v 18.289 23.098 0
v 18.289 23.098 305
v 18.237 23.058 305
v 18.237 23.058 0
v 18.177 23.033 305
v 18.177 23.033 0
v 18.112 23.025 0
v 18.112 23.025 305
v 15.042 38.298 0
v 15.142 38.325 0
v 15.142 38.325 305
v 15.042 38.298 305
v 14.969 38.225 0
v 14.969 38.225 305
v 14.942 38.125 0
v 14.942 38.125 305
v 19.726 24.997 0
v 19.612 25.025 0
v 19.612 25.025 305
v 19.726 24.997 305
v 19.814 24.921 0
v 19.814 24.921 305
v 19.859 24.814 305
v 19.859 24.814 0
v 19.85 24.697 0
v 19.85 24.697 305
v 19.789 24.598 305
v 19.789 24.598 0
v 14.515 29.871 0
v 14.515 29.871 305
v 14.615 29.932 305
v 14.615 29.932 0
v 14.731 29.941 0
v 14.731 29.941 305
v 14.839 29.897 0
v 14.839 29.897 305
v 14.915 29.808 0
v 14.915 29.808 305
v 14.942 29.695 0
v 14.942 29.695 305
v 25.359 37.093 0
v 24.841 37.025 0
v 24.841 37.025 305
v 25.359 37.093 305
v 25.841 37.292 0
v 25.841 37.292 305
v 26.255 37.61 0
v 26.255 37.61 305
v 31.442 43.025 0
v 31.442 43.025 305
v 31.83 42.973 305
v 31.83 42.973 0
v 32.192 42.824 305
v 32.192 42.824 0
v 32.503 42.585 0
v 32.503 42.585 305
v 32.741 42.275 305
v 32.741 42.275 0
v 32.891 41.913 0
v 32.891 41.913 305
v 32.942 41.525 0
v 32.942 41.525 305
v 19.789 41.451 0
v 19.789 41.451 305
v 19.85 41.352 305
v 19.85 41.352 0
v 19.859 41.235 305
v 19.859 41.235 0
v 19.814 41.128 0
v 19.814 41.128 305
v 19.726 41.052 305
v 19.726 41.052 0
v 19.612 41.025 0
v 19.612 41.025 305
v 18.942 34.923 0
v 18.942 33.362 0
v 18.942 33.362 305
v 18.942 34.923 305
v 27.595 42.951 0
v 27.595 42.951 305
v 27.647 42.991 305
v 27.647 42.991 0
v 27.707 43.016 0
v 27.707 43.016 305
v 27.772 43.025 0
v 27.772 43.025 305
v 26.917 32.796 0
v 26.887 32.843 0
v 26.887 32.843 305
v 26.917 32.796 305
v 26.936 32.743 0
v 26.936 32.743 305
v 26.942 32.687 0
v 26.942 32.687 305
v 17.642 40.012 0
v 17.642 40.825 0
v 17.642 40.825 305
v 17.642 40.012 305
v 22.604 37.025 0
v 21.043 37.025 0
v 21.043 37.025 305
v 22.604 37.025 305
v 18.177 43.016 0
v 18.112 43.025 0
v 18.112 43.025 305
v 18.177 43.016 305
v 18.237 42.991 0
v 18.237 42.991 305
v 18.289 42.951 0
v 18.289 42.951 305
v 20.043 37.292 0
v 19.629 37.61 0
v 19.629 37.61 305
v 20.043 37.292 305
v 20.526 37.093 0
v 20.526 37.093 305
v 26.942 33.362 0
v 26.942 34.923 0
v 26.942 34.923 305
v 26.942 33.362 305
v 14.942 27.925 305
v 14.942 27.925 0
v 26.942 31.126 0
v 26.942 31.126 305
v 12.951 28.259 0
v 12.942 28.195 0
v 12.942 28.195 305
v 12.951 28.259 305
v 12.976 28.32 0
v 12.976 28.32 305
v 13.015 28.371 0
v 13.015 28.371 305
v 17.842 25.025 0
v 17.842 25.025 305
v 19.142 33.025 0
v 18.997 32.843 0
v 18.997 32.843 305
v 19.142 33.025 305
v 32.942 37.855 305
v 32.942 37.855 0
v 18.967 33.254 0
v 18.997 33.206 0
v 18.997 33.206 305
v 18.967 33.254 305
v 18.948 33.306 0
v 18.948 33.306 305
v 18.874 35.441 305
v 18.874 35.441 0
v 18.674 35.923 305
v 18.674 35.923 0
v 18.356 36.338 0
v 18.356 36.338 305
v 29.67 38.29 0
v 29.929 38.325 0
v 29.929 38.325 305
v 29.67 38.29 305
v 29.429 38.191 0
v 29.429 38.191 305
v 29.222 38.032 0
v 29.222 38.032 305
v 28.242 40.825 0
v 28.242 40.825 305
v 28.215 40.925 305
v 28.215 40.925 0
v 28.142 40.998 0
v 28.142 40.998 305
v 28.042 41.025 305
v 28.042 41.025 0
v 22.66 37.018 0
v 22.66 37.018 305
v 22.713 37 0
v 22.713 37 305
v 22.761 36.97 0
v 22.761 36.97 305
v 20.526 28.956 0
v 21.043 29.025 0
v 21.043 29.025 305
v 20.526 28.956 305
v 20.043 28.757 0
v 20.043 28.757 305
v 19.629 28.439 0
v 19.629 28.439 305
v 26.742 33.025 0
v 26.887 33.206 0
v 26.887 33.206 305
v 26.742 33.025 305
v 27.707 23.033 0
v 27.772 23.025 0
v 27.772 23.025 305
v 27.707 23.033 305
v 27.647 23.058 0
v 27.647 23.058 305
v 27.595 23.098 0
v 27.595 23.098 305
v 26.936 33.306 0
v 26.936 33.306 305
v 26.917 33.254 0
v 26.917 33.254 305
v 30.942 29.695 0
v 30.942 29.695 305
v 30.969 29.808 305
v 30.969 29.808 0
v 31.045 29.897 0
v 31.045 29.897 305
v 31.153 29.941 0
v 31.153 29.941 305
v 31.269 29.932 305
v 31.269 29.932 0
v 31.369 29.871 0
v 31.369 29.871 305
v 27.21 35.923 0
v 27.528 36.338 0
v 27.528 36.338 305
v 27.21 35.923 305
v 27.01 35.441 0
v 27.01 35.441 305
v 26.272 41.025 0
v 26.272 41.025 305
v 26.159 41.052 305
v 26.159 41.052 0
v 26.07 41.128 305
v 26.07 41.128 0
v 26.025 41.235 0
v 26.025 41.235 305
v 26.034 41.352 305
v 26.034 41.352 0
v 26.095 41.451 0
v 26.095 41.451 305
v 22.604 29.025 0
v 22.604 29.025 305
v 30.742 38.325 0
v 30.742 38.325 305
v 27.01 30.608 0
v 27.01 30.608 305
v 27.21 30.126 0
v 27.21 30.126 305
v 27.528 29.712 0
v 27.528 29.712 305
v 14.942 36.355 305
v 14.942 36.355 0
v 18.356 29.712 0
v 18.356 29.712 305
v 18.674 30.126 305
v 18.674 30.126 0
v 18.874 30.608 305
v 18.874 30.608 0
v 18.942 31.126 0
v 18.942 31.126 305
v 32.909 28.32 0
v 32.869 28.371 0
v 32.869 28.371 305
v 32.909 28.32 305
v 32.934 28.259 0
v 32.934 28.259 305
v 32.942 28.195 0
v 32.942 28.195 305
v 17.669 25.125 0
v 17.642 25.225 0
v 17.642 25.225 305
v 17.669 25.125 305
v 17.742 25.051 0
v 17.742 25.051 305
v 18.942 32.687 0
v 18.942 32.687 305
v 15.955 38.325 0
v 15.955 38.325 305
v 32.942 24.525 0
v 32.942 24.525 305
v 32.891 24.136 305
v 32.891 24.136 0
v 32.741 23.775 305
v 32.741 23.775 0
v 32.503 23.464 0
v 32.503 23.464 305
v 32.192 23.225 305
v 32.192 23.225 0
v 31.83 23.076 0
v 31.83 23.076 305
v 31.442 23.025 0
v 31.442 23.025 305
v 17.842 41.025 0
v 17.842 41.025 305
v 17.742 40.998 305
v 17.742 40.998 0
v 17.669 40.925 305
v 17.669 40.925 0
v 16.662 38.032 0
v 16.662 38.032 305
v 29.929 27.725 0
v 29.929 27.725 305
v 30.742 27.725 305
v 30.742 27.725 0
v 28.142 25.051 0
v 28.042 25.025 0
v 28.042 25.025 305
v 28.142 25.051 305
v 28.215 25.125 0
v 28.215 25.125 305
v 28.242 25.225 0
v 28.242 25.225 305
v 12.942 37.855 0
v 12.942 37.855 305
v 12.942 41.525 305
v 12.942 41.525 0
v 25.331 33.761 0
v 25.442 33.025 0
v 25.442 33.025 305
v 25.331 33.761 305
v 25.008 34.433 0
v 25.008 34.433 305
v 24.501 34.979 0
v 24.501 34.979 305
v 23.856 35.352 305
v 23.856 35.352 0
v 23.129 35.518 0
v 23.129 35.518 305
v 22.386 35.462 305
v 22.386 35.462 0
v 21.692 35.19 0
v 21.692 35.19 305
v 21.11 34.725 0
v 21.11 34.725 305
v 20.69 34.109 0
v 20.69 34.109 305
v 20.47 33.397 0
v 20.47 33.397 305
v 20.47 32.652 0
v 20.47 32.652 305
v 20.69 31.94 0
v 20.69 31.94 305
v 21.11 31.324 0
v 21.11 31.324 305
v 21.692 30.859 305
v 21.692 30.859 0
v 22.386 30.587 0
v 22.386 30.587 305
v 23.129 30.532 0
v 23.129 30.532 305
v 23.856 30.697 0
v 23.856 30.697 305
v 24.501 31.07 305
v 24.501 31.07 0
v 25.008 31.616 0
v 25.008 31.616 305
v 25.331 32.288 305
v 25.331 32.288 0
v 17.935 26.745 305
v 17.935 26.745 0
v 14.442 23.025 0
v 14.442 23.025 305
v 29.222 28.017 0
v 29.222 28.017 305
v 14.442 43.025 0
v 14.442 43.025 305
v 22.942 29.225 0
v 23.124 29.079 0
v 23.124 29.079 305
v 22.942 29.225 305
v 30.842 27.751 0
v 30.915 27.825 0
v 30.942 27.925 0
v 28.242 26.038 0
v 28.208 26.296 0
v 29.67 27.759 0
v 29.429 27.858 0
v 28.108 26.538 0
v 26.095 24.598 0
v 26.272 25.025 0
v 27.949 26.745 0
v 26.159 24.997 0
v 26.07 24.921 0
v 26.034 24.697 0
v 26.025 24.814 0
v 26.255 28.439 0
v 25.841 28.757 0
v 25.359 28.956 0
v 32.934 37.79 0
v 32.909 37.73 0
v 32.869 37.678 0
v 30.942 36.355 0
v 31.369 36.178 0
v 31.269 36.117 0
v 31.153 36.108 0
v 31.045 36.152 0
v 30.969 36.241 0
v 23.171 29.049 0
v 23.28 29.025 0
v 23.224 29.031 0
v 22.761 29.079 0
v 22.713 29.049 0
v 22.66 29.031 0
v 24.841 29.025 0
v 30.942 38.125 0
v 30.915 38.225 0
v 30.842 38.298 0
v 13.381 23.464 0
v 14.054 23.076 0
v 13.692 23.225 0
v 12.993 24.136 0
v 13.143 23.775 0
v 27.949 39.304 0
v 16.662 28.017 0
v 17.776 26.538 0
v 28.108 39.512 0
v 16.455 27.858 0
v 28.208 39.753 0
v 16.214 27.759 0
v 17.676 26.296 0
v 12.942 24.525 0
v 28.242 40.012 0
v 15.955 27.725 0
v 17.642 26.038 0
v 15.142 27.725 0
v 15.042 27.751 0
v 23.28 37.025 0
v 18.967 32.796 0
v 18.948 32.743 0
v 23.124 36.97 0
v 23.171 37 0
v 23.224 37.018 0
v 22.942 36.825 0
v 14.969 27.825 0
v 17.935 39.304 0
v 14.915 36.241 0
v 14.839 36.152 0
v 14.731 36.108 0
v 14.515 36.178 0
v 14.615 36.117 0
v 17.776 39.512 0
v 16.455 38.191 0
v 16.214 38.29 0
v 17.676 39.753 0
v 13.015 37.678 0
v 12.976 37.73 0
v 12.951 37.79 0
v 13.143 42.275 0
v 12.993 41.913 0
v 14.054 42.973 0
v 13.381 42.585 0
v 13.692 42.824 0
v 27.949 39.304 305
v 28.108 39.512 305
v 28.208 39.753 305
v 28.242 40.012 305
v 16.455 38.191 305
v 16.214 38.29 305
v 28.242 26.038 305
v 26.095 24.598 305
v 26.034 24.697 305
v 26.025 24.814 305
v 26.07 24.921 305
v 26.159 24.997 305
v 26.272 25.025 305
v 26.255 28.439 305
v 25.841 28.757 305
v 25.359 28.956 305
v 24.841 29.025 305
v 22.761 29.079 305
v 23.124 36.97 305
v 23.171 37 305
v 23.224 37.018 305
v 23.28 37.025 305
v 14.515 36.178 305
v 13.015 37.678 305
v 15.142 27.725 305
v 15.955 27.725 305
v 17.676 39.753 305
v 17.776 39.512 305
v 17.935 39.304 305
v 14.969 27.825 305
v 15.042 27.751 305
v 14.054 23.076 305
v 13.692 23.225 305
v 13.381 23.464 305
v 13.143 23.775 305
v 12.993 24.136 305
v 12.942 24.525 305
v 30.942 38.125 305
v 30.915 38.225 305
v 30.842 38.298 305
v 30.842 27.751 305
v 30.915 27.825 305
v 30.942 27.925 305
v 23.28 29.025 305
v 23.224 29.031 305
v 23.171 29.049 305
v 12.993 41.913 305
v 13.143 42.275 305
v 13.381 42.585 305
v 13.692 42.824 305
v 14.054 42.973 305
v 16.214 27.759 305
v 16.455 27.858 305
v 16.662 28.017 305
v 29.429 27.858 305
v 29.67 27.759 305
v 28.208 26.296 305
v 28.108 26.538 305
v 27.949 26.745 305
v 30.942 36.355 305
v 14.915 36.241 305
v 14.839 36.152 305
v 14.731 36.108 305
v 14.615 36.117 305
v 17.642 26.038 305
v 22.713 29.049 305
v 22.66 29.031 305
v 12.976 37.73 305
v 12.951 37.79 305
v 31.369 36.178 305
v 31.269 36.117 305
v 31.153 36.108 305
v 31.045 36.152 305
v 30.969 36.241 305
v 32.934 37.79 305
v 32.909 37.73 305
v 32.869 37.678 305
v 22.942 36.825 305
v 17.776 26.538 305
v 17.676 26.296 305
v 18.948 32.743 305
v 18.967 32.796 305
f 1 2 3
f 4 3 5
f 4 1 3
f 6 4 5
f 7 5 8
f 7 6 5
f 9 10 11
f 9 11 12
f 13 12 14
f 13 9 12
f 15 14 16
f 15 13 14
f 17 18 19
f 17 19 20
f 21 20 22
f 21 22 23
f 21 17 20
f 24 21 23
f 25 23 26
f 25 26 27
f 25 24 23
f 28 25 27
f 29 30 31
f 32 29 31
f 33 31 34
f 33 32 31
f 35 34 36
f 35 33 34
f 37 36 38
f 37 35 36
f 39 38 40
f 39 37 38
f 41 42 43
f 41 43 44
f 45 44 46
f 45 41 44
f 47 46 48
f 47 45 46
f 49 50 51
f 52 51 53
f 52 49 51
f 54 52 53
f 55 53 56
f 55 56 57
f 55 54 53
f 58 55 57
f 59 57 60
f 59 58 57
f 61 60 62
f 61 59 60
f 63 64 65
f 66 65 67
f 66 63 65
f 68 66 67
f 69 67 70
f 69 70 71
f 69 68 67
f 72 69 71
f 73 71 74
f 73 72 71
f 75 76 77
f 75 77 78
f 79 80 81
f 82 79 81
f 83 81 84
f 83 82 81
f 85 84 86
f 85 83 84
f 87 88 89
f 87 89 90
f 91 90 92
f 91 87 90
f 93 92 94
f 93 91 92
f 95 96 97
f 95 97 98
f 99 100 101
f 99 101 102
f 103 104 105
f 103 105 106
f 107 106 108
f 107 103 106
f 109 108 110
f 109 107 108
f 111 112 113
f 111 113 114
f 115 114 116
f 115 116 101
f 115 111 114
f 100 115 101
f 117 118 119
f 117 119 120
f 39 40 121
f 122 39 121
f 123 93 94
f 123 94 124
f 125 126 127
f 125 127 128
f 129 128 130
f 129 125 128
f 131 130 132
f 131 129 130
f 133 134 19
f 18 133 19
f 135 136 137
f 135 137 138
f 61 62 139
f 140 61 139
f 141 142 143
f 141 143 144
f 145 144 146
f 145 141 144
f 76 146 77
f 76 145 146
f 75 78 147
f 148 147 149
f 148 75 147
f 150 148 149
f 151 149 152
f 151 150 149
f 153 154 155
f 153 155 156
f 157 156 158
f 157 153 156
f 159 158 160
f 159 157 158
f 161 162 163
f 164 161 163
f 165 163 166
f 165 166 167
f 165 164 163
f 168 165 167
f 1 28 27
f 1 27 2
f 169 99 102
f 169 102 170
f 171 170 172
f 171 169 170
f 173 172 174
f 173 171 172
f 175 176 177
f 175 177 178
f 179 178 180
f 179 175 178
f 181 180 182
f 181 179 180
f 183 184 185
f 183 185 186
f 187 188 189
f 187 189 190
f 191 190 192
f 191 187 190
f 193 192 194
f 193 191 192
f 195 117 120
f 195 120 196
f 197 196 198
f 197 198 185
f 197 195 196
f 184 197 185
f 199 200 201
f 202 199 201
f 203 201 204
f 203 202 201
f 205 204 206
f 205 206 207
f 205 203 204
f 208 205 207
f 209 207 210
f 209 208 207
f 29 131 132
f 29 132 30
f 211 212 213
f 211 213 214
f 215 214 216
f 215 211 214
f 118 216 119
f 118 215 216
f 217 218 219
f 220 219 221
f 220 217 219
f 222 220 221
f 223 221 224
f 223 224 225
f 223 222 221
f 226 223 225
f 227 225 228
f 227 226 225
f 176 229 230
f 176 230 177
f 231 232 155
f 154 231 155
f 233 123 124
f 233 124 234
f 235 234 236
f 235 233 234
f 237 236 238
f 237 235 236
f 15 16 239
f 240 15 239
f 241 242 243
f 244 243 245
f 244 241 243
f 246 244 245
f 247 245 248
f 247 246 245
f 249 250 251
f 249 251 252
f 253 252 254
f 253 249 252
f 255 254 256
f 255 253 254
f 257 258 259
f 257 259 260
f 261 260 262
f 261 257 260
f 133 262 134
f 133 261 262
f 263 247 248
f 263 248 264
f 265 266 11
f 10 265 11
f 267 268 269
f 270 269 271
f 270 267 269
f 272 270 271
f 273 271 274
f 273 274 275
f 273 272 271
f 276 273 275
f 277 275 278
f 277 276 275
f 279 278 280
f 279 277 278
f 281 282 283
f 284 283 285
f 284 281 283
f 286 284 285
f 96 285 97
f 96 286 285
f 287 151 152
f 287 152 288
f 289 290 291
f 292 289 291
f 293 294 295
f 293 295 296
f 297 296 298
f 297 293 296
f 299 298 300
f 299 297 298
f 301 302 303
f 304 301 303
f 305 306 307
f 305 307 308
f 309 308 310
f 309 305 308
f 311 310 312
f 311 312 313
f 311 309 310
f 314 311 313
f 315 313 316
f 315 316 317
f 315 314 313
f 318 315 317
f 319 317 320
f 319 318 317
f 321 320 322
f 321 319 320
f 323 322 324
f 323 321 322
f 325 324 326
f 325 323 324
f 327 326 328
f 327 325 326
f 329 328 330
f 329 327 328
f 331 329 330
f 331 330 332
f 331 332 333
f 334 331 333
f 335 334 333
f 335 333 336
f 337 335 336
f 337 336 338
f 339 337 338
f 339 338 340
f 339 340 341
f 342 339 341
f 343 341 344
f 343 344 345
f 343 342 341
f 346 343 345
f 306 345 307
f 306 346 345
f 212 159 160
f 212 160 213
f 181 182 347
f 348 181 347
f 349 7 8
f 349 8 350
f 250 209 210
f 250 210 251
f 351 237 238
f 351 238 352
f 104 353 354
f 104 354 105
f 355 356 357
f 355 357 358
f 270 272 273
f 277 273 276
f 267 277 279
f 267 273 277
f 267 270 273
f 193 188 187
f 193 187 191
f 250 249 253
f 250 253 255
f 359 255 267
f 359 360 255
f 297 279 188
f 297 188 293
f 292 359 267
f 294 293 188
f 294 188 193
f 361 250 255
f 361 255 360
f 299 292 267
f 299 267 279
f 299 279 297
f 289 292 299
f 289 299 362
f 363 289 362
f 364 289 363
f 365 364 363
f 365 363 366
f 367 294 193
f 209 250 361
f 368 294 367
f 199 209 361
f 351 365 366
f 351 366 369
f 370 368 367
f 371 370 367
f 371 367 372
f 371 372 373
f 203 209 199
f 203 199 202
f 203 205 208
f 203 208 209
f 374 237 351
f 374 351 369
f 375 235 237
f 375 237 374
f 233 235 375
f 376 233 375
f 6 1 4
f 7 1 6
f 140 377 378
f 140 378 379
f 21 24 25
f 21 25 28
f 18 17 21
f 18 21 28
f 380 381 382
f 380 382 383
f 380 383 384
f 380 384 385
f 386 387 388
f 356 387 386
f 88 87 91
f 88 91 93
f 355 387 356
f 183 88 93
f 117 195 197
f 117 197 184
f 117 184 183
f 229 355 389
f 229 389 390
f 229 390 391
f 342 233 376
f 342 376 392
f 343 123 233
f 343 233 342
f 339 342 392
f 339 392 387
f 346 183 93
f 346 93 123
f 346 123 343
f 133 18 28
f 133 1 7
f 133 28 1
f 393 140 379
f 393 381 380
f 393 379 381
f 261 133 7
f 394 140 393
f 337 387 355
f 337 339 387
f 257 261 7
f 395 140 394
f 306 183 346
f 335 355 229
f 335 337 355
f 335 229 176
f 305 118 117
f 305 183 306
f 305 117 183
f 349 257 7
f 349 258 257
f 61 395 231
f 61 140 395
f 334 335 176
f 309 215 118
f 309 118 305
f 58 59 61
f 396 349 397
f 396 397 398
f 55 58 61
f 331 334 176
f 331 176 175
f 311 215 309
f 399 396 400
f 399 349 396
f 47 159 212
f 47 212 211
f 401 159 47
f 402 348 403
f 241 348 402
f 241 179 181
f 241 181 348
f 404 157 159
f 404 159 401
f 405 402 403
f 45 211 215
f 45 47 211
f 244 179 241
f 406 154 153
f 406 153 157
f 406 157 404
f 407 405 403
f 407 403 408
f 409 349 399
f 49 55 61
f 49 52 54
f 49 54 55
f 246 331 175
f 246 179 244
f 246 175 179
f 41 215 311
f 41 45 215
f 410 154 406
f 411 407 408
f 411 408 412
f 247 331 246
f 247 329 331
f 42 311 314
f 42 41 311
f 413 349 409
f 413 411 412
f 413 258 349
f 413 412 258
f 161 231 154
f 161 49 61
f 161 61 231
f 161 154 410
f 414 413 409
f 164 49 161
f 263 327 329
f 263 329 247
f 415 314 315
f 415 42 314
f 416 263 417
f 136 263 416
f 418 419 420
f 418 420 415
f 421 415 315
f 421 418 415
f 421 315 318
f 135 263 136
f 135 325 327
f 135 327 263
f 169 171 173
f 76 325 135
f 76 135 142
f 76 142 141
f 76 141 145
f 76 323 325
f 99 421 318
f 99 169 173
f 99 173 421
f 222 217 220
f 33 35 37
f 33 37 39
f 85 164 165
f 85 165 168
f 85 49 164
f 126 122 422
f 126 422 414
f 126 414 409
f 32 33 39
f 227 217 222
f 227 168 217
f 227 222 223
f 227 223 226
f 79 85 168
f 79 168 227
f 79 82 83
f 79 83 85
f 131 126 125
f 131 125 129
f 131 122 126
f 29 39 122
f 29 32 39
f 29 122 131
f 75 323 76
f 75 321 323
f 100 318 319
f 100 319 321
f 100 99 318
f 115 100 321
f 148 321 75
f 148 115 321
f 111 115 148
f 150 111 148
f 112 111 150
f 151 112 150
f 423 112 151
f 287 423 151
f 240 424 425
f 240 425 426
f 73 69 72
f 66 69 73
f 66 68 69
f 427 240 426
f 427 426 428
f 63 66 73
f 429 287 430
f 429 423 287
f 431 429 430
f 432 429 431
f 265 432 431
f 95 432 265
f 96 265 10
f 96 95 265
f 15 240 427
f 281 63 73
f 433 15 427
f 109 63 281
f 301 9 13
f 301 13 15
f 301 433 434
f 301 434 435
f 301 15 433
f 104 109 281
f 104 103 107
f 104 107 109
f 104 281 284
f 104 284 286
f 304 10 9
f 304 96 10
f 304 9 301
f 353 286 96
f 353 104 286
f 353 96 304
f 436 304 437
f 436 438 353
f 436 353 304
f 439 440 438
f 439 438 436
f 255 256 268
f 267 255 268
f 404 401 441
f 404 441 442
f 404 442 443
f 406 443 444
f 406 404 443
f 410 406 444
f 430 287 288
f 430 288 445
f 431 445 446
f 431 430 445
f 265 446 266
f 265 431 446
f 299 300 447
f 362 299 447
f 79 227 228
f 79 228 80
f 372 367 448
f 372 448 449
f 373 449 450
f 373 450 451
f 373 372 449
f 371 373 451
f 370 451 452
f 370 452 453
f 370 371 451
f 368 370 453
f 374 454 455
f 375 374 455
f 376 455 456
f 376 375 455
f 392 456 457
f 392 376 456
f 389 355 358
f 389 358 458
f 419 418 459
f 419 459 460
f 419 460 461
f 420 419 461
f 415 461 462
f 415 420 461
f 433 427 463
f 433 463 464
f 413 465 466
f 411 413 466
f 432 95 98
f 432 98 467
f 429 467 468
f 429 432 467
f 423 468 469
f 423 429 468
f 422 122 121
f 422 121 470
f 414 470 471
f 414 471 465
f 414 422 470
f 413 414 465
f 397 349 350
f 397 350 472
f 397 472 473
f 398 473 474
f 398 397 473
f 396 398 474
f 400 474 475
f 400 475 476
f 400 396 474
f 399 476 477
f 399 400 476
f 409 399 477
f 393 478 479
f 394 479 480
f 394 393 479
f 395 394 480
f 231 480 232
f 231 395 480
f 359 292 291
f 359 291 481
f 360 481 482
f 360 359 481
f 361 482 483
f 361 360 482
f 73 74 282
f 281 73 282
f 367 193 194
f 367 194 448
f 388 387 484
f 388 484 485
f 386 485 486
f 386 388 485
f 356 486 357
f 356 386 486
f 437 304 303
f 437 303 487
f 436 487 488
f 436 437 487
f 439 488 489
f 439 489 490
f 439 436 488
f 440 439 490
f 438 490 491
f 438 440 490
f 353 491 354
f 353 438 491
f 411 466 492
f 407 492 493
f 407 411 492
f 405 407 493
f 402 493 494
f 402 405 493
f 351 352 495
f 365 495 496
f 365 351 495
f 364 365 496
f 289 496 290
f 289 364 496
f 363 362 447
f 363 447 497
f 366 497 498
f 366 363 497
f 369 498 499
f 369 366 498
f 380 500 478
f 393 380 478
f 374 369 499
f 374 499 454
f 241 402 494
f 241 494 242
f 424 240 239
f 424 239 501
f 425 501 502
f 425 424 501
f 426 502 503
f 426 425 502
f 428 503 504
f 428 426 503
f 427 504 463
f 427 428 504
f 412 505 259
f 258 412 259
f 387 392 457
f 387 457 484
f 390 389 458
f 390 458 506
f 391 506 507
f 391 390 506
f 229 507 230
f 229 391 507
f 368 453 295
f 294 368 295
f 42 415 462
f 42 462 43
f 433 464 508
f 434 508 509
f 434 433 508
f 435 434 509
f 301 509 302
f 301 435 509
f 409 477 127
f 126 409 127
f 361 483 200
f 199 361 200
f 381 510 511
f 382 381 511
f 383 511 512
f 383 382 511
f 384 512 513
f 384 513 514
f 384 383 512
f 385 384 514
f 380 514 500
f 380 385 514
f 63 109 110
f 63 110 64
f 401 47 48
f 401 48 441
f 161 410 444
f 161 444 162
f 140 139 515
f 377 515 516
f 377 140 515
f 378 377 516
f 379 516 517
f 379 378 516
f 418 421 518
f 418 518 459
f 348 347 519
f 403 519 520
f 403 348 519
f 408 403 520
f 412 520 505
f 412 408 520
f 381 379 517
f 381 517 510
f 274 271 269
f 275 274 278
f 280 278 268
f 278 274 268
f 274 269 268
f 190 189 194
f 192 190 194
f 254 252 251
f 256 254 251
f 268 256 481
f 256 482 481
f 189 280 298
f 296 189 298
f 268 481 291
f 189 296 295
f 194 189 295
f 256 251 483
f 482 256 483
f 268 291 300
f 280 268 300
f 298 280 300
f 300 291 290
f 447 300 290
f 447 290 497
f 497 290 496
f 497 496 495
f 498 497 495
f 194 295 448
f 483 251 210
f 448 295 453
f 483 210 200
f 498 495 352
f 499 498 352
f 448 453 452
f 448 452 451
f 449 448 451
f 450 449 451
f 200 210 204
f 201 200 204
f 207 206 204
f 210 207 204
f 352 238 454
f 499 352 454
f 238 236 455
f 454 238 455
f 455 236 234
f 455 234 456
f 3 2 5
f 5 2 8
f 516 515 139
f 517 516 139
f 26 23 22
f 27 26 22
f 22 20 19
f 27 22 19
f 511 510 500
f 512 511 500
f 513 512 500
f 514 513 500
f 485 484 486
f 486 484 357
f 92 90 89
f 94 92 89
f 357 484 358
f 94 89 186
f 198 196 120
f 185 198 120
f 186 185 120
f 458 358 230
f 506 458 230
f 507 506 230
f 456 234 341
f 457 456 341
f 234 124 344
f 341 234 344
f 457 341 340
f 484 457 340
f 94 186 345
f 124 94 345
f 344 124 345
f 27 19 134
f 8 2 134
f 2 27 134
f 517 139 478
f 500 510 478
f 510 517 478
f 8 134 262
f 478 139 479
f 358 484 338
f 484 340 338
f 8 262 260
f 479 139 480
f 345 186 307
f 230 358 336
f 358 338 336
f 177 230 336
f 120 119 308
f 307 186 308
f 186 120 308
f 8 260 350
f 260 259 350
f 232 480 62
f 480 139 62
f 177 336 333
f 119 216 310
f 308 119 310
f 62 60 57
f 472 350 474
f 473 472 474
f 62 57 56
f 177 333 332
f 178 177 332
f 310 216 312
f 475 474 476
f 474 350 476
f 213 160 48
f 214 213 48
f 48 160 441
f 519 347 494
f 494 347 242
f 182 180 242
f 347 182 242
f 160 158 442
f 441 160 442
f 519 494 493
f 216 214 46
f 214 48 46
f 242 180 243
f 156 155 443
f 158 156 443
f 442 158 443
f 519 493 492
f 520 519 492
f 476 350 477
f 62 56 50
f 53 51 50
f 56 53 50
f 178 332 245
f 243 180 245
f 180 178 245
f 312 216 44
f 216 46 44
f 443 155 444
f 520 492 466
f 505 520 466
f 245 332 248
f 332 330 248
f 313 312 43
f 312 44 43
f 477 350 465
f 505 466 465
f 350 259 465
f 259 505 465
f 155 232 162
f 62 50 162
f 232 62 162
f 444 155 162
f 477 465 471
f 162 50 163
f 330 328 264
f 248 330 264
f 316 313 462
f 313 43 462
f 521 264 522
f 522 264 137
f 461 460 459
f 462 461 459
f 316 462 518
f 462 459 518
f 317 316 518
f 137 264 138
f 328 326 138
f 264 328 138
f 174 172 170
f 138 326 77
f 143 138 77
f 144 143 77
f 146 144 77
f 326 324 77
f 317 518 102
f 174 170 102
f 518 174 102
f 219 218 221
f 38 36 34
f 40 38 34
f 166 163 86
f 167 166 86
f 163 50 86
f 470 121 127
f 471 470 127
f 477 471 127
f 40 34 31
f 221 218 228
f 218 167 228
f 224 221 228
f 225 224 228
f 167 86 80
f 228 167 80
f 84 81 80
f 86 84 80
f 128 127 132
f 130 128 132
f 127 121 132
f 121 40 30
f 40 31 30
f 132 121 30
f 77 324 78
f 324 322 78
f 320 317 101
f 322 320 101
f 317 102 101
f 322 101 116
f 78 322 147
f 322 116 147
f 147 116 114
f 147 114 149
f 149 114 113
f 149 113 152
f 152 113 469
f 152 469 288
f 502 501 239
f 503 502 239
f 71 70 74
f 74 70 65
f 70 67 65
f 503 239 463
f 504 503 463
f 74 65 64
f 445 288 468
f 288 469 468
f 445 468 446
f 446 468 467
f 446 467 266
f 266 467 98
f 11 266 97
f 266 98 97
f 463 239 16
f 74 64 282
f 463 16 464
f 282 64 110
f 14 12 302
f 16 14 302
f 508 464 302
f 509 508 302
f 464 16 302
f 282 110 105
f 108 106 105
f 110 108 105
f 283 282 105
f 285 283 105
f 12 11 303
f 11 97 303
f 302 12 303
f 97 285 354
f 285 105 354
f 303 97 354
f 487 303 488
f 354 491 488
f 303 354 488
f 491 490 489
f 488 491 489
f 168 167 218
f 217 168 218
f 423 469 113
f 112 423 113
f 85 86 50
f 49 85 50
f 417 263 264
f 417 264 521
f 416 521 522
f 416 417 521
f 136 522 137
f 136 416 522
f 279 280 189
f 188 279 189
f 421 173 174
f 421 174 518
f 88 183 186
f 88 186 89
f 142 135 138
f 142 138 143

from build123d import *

# Parameters (mm, degrees)
MODEL_R         = 2.5
EXTRUDE_1_DEPTH = 305


with BuildPart() as part:
    # Model → Бобышка-Вытянуть1 (new body)
    with BuildSketch(Plane.XY):
        with BuildLine():
            Line((18.94214915, 33.362214718), (18.94214915, 34.923300122))
            ThreePointArc((18.94214915, 34.923300122), (18.789908215, 35.688666987), (18.356362712, 36.337513684))
            Line((18.356362712, 36.337513684), (16.662250163, 38.031626234))
            ThreePointArc((16.662250163, 38.031626234), (16.337826814, 38.248398985), (15.955143382, 38.324519453))
            Line((15.955143382, 38.324519453), (15.14214915, 38.324519453))
            ThreePointArc((15.14214915, 38.324519453), (15.000727794, 38.265940809), (14.94214915, 38.124519453))
            Line((14.94214915, 38.124519453), (14.94214915, 36.354519453))
            ThreePointArc((14.94214915, 36.354519453), (14.787820008, 36.12354957), (14.515372455, 36.177742757))
            Line((14.515372455, 36.177742757), (13.015372455, 37.677742757))
            ThreePointArc((13.015372455, 37.677742757), (12.961179267, 37.758848595), (12.94214915, 37.854519453))
            Line((12.94214915, 37.854519453), (12.94214915, 41.524519453))
            ThreePointArc((12.94214915, 41.524519453), (13.381488978, 42.585179625), (14.44214915, 43.024519453))
            Line((14.44214915, 43.024519453), (18.11214915, 43.024519453))
            ThreePointArc((18.11214915, 43.024519453), (18.207820008, 43.005489336), (18.288925845, 42.951296148))
            Line((18.288925845, 42.951296148), (19.788925845, 41.451296148))
            ThreePointArc((19.788925845, 41.451296148), (19.843119033, 41.178848595), (19.61214915, 41.024519453))
            Line((19.61214915, 41.024519453), (17.84214915, 41.024519453))
            ThreePointArc((17.84214915, 41.024519453), (17.700727794, 40.965940809), (17.64214915, 40.824519453))
            Line((17.64214915, 40.824519453), (17.64214915, 40.011525221))
            ThreePointArc((17.64214915, 40.011525221), (17.718269617, 39.628841789), (17.935042369, 39.30441844))
            Line((17.935042369, 39.30441844), (19.629154919, 37.61030589))
            ThreePointArc((19.629154919, 37.61030589), (20.278001616, 37.176760388), (21.043368481, 37.024519453))
            Line((21.043368481, 37.024519453), (22.604453885, 37.024519453))
            ThreePointArc((22.604453885, 37.024519453), (22.687205621, 37.010426533), (22.760627647, 36.969736655))
            Line((22.760627647, 36.969736655), (22.94214915, 36.824519453))
            Line((22.94214915, 36.824519453), (23.123670653, 36.969736655))
            ThreePointArc((23.123670653, 36.969736655), (23.197092679, 37.010426533), (23.279844415, 37.024519453))
            Line((23.279844415, 37.024519453), (24.840929819, 37.024519453))
            ThreePointArc((24.840929819, 37.024519453), (25.606296684, 37.176760388), (26.255143382, 37.61030589))
            Line((26.255143382, 37.61030589), (27.949255931, 39.30441844))
            ThreePointArc((27.949255931, 39.30441844), (28.166028683, 39.628841789), (28.24214915, 40.011525221))
            Line((28.24214915, 40.011525221), (28.24214915, 40.824519453))
            ThreePointArc((28.24214915, 40.824519453), (28.183570506, 40.965940809), (28.04214915, 41.024519453))
            Line((28.04214915, 41.024519453), (26.27214915, 41.024519453))
            ThreePointArc((26.27214915, 41.024519453), (26.041179267, 41.178848595), (26.095372455, 41.451296148))
            Line((26.095372455, 41.451296148), (27.595372455, 42.951296148))
            ThreePointArc((27.595372455, 42.951296148), (27.676478292, 43.005489336), (27.77214915, 43.024519453))
            Line((27.77214915, 43.024519453), (31.44214915, 43.024519453))
            ThreePointArc((31.44214915, 43.024519453), (32.502809322, 42.585179625), (32.94214915, 41.524519453))
            Line((32.94214915, 41.524519453), (32.94214915, 37.854519453))
            ThreePointArc((32.94214915, 37.854519453), (32.923119033, 37.758848595), (32.868925845, 37.677742757))
            Line((32.868925845, 37.677742757), (31.368925845, 36.177742757))
            ThreePointArc((31.368925845, 36.177742757), (31.096478292, 36.12354957), (30.94214915, 36.354519453))
            Line((30.94214915, 36.354519453), (30.94214915, 38.124519453))
            ThreePointArc((30.94214915, 38.124519453), (30.883570506, 38.265940809), (30.74214915, 38.324519453))
            Line((30.74214915, 38.324519453), (29.929154919, 38.324519453))
            ThreePointArc((29.929154919, 38.324519453), (29.546471486, 38.248398985), (29.222048137, 38.031626234))
            Line((29.222048137, 38.031626234), (27.527935588, 36.337513684))
            ThreePointArc((27.527935588, 36.337513684), (27.094390085, 35.688666987), (26.94214915, 34.923300122))
            Line((26.94214915, 34.923300122), (26.94214915, 33.362214718))
            ThreePointArc((26.94214915, 33.362214718), (26.92805623, 33.279462982), (26.887366352, 33.206040956))
            Line((26.887366352, 33.206040956), (26.74214915, 33.024519453))
            Line((26.74214915, 33.024519453), (26.887366352, 32.84299795))
            ThreePointArc((26.887366352, 32.84299795), (26.92805623, 32.769575923), (26.94214915, 32.686824188))
            Line((26.94214915, 32.686824188), (26.94214915, 31.125738784))
            ThreePointArc((26.94214915, 31.125738784), (27.094390085, 30.360371919), (27.527935588, 29.711525221))
            Line((27.527935588, 29.711525221), (29.222048137, 28.017412672))
            ThreePointArc((29.222048137, 28.017412672), (29.546471486, 27.80063992), (29.929154919, 27.724519453))
            Line((29.929154919, 27.724519453), (30.74214915, 27.724519453))
            ThreePointArc((30.74214915, 27.724519453), (30.883570506, 27.783098097), (30.94214915, 27.924519453))
            Line((30.94214915, 27.924519453), (30.94214915, 29.694519453))
            ThreePointArc((30.94214915, 29.694519453), (31.096478292, 29.925489336), (31.368925845, 29.871296148))
            Line((31.368925845, 29.871296148), (32.868925845, 28.371296148))
            ThreePointArc((32.868925845, 28.371296148), (32.923119033, 28.290190311), (32.94214915, 28.194519453))
            Line((32.94214915, 28.194519453), (32.94214915, 24.524519453))
            ThreePointArc((32.94214915, 24.524519453), (32.502809322, 23.463859281), (31.44214915, 23.024519453))
            Line((31.44214915, 23.024519453), (27.77214915, 23.024519453))
            ThreePointArc((27.77214915, 23.024519453), (27.676478292, 23.04354957), (27.595372455, 23.097742757))
            Line((27.595372455, 23.097742757), (26.095372455, 24.597742757))
            ThreePointArc((26.095372455, 24.597742757), (26.041179267, 24.870190311), (26.27214915, 25.024519453))
            Line((26.27214915, 25.024519453), (28.04214915, 25.024519453))
            ThreePointArc((28.04214915, 25.024519453), (28.183570506, 25.083098097), (28.24214915, 25.224519453))
            Line((28.24214915, 25.224519453), (28.24214915, 26.037513684))
            ThreePointArc((28.24214915, 26.037513684), (28.166028683, 26.420197117), (27.949255931, 26.744620465))
            Line((27.949255931, 26.744620465), (26.255143382, 28.438733015))
            ThreePointArc((26.255143382, 28.438733015), (25.606296684, 28.872278518), (24.840929819, 29.024519453))
            Line((24.840929819, 29.024519453), (23.279844415, 29.024519453))
            ThreePointArc((23.279844415, 29.024519453), (23.197092679, 29.038612373), (23.123670653, 29.07930225))
            Line((23.123670653, 29.07930225), (22.94214915, 29.224519453))
            Line((22.94214915, 29.224519453), (22.760627647, 29.07930225))
            ThreePointArc((22.760627647, 29.07930225), (22.687205621, 29.038612373), (22.604453885, 29.024519453))
            Line((22.604453885, 29.024519453), (21.043368481, 29.024519453))
            ThreePointArc((21.043368481, 29.024519453), (20.278001616, 28.872278518), (19.629154919, 28.438733015))
            Line((19.629154919, 28.438733015), (17.935042369, 26.744620465))
            ThreePointArc((17.935042369, 26.744620465), (17.718269617, 26.420197117), (17.64214915, 26.037513684))
            Line((17.64214915, 26.037513684), (17.64214915, 25.224519453))
            ThreePointArc((17.64214915, 25.224519453), (17.700727794, 25.083098097), (17.84214915, 25.024519453))
            Line((17.84214915, 25.024519453), (19.61214915, 25.024519453))
            ThreePointArc((19.61214915, 25.024519453), (19.843119033, 24.870190311), (19.788925845, 24.597742757))
            Line((19.788925845, 24.597742757), (18.288925845, 23.097742757))
            ThreePointArc((18.288925845, 23.097742757), (18.207820008, 23.04354957), (18.11214915, 23.024519453))
            Line((18.11214915, 23.024519453), (14.44214915, 23.024519453))
            ThreePointArc((14.44214915, 23.024519453), (13.381488978, 23.463859281), (12.94214915, 24.524519453))
            Line((12.94214915, 24.524519453), (12.94214915, 28.194519453))
            ThreePointArc((12.94214915, 28.194519453), (12.961179267, 28.290190311), (13.015372455, 28.371296148))
            Line((13.015372455, 28.371296148), (14.515372455, 29.871296148))
            ThreePointArc((14.515372455, 29.871296148), (14.787820008, 29.925489336), (14.94214915, 29.694519453))
            Line((14.94214915, 29.694519453), (14.94214915, 27.924519453))
            ThreePointArc((14.94214915, 27.924519453), (15.000727794, 27.783098097), (15.14214915, 27.724519453))
            Line((15.14214915, 27.724519453), (15.955143382, 27.724519453))
            ThreePointArc((15.955143382, 27.724519453), (16.337826814, 27.80063992), (16.662250163, 28.017412672))
            Line((16.662250163, 28.017412672), (18.356362712, 29.711525221))
            ThreePointArc((18.356362712, 29.711525221), (18.789908215, 30.360371919), (18.94214915, 31.125738784))
            Line((18.94214915, 31.125738784), (18.94214915, 32.686824188))
            ThreePointArc((18.94214915, 32.686824188), (18.95624207, 32.769575923), (18.996931948, 32.84299795))
            Line((18.996931948, 32.84299795), (19.14214915, 33.024519453))
            Line((19.14214915, 33.024519453), (18.996931948, 33.206040956))
            ThreePointArc((18.996931948, 33.206040956), (18.95624207, 33.279462982), (18.94214915, 33.362214718))
        make_face()
        with Locations((22.94214915, 33.024519453)):
            Circle(MODEL_R, mode=Mode.SUBTRACT)
    extrude(amount=EXTRUDE_1_DEPTH)


solid = part.part
